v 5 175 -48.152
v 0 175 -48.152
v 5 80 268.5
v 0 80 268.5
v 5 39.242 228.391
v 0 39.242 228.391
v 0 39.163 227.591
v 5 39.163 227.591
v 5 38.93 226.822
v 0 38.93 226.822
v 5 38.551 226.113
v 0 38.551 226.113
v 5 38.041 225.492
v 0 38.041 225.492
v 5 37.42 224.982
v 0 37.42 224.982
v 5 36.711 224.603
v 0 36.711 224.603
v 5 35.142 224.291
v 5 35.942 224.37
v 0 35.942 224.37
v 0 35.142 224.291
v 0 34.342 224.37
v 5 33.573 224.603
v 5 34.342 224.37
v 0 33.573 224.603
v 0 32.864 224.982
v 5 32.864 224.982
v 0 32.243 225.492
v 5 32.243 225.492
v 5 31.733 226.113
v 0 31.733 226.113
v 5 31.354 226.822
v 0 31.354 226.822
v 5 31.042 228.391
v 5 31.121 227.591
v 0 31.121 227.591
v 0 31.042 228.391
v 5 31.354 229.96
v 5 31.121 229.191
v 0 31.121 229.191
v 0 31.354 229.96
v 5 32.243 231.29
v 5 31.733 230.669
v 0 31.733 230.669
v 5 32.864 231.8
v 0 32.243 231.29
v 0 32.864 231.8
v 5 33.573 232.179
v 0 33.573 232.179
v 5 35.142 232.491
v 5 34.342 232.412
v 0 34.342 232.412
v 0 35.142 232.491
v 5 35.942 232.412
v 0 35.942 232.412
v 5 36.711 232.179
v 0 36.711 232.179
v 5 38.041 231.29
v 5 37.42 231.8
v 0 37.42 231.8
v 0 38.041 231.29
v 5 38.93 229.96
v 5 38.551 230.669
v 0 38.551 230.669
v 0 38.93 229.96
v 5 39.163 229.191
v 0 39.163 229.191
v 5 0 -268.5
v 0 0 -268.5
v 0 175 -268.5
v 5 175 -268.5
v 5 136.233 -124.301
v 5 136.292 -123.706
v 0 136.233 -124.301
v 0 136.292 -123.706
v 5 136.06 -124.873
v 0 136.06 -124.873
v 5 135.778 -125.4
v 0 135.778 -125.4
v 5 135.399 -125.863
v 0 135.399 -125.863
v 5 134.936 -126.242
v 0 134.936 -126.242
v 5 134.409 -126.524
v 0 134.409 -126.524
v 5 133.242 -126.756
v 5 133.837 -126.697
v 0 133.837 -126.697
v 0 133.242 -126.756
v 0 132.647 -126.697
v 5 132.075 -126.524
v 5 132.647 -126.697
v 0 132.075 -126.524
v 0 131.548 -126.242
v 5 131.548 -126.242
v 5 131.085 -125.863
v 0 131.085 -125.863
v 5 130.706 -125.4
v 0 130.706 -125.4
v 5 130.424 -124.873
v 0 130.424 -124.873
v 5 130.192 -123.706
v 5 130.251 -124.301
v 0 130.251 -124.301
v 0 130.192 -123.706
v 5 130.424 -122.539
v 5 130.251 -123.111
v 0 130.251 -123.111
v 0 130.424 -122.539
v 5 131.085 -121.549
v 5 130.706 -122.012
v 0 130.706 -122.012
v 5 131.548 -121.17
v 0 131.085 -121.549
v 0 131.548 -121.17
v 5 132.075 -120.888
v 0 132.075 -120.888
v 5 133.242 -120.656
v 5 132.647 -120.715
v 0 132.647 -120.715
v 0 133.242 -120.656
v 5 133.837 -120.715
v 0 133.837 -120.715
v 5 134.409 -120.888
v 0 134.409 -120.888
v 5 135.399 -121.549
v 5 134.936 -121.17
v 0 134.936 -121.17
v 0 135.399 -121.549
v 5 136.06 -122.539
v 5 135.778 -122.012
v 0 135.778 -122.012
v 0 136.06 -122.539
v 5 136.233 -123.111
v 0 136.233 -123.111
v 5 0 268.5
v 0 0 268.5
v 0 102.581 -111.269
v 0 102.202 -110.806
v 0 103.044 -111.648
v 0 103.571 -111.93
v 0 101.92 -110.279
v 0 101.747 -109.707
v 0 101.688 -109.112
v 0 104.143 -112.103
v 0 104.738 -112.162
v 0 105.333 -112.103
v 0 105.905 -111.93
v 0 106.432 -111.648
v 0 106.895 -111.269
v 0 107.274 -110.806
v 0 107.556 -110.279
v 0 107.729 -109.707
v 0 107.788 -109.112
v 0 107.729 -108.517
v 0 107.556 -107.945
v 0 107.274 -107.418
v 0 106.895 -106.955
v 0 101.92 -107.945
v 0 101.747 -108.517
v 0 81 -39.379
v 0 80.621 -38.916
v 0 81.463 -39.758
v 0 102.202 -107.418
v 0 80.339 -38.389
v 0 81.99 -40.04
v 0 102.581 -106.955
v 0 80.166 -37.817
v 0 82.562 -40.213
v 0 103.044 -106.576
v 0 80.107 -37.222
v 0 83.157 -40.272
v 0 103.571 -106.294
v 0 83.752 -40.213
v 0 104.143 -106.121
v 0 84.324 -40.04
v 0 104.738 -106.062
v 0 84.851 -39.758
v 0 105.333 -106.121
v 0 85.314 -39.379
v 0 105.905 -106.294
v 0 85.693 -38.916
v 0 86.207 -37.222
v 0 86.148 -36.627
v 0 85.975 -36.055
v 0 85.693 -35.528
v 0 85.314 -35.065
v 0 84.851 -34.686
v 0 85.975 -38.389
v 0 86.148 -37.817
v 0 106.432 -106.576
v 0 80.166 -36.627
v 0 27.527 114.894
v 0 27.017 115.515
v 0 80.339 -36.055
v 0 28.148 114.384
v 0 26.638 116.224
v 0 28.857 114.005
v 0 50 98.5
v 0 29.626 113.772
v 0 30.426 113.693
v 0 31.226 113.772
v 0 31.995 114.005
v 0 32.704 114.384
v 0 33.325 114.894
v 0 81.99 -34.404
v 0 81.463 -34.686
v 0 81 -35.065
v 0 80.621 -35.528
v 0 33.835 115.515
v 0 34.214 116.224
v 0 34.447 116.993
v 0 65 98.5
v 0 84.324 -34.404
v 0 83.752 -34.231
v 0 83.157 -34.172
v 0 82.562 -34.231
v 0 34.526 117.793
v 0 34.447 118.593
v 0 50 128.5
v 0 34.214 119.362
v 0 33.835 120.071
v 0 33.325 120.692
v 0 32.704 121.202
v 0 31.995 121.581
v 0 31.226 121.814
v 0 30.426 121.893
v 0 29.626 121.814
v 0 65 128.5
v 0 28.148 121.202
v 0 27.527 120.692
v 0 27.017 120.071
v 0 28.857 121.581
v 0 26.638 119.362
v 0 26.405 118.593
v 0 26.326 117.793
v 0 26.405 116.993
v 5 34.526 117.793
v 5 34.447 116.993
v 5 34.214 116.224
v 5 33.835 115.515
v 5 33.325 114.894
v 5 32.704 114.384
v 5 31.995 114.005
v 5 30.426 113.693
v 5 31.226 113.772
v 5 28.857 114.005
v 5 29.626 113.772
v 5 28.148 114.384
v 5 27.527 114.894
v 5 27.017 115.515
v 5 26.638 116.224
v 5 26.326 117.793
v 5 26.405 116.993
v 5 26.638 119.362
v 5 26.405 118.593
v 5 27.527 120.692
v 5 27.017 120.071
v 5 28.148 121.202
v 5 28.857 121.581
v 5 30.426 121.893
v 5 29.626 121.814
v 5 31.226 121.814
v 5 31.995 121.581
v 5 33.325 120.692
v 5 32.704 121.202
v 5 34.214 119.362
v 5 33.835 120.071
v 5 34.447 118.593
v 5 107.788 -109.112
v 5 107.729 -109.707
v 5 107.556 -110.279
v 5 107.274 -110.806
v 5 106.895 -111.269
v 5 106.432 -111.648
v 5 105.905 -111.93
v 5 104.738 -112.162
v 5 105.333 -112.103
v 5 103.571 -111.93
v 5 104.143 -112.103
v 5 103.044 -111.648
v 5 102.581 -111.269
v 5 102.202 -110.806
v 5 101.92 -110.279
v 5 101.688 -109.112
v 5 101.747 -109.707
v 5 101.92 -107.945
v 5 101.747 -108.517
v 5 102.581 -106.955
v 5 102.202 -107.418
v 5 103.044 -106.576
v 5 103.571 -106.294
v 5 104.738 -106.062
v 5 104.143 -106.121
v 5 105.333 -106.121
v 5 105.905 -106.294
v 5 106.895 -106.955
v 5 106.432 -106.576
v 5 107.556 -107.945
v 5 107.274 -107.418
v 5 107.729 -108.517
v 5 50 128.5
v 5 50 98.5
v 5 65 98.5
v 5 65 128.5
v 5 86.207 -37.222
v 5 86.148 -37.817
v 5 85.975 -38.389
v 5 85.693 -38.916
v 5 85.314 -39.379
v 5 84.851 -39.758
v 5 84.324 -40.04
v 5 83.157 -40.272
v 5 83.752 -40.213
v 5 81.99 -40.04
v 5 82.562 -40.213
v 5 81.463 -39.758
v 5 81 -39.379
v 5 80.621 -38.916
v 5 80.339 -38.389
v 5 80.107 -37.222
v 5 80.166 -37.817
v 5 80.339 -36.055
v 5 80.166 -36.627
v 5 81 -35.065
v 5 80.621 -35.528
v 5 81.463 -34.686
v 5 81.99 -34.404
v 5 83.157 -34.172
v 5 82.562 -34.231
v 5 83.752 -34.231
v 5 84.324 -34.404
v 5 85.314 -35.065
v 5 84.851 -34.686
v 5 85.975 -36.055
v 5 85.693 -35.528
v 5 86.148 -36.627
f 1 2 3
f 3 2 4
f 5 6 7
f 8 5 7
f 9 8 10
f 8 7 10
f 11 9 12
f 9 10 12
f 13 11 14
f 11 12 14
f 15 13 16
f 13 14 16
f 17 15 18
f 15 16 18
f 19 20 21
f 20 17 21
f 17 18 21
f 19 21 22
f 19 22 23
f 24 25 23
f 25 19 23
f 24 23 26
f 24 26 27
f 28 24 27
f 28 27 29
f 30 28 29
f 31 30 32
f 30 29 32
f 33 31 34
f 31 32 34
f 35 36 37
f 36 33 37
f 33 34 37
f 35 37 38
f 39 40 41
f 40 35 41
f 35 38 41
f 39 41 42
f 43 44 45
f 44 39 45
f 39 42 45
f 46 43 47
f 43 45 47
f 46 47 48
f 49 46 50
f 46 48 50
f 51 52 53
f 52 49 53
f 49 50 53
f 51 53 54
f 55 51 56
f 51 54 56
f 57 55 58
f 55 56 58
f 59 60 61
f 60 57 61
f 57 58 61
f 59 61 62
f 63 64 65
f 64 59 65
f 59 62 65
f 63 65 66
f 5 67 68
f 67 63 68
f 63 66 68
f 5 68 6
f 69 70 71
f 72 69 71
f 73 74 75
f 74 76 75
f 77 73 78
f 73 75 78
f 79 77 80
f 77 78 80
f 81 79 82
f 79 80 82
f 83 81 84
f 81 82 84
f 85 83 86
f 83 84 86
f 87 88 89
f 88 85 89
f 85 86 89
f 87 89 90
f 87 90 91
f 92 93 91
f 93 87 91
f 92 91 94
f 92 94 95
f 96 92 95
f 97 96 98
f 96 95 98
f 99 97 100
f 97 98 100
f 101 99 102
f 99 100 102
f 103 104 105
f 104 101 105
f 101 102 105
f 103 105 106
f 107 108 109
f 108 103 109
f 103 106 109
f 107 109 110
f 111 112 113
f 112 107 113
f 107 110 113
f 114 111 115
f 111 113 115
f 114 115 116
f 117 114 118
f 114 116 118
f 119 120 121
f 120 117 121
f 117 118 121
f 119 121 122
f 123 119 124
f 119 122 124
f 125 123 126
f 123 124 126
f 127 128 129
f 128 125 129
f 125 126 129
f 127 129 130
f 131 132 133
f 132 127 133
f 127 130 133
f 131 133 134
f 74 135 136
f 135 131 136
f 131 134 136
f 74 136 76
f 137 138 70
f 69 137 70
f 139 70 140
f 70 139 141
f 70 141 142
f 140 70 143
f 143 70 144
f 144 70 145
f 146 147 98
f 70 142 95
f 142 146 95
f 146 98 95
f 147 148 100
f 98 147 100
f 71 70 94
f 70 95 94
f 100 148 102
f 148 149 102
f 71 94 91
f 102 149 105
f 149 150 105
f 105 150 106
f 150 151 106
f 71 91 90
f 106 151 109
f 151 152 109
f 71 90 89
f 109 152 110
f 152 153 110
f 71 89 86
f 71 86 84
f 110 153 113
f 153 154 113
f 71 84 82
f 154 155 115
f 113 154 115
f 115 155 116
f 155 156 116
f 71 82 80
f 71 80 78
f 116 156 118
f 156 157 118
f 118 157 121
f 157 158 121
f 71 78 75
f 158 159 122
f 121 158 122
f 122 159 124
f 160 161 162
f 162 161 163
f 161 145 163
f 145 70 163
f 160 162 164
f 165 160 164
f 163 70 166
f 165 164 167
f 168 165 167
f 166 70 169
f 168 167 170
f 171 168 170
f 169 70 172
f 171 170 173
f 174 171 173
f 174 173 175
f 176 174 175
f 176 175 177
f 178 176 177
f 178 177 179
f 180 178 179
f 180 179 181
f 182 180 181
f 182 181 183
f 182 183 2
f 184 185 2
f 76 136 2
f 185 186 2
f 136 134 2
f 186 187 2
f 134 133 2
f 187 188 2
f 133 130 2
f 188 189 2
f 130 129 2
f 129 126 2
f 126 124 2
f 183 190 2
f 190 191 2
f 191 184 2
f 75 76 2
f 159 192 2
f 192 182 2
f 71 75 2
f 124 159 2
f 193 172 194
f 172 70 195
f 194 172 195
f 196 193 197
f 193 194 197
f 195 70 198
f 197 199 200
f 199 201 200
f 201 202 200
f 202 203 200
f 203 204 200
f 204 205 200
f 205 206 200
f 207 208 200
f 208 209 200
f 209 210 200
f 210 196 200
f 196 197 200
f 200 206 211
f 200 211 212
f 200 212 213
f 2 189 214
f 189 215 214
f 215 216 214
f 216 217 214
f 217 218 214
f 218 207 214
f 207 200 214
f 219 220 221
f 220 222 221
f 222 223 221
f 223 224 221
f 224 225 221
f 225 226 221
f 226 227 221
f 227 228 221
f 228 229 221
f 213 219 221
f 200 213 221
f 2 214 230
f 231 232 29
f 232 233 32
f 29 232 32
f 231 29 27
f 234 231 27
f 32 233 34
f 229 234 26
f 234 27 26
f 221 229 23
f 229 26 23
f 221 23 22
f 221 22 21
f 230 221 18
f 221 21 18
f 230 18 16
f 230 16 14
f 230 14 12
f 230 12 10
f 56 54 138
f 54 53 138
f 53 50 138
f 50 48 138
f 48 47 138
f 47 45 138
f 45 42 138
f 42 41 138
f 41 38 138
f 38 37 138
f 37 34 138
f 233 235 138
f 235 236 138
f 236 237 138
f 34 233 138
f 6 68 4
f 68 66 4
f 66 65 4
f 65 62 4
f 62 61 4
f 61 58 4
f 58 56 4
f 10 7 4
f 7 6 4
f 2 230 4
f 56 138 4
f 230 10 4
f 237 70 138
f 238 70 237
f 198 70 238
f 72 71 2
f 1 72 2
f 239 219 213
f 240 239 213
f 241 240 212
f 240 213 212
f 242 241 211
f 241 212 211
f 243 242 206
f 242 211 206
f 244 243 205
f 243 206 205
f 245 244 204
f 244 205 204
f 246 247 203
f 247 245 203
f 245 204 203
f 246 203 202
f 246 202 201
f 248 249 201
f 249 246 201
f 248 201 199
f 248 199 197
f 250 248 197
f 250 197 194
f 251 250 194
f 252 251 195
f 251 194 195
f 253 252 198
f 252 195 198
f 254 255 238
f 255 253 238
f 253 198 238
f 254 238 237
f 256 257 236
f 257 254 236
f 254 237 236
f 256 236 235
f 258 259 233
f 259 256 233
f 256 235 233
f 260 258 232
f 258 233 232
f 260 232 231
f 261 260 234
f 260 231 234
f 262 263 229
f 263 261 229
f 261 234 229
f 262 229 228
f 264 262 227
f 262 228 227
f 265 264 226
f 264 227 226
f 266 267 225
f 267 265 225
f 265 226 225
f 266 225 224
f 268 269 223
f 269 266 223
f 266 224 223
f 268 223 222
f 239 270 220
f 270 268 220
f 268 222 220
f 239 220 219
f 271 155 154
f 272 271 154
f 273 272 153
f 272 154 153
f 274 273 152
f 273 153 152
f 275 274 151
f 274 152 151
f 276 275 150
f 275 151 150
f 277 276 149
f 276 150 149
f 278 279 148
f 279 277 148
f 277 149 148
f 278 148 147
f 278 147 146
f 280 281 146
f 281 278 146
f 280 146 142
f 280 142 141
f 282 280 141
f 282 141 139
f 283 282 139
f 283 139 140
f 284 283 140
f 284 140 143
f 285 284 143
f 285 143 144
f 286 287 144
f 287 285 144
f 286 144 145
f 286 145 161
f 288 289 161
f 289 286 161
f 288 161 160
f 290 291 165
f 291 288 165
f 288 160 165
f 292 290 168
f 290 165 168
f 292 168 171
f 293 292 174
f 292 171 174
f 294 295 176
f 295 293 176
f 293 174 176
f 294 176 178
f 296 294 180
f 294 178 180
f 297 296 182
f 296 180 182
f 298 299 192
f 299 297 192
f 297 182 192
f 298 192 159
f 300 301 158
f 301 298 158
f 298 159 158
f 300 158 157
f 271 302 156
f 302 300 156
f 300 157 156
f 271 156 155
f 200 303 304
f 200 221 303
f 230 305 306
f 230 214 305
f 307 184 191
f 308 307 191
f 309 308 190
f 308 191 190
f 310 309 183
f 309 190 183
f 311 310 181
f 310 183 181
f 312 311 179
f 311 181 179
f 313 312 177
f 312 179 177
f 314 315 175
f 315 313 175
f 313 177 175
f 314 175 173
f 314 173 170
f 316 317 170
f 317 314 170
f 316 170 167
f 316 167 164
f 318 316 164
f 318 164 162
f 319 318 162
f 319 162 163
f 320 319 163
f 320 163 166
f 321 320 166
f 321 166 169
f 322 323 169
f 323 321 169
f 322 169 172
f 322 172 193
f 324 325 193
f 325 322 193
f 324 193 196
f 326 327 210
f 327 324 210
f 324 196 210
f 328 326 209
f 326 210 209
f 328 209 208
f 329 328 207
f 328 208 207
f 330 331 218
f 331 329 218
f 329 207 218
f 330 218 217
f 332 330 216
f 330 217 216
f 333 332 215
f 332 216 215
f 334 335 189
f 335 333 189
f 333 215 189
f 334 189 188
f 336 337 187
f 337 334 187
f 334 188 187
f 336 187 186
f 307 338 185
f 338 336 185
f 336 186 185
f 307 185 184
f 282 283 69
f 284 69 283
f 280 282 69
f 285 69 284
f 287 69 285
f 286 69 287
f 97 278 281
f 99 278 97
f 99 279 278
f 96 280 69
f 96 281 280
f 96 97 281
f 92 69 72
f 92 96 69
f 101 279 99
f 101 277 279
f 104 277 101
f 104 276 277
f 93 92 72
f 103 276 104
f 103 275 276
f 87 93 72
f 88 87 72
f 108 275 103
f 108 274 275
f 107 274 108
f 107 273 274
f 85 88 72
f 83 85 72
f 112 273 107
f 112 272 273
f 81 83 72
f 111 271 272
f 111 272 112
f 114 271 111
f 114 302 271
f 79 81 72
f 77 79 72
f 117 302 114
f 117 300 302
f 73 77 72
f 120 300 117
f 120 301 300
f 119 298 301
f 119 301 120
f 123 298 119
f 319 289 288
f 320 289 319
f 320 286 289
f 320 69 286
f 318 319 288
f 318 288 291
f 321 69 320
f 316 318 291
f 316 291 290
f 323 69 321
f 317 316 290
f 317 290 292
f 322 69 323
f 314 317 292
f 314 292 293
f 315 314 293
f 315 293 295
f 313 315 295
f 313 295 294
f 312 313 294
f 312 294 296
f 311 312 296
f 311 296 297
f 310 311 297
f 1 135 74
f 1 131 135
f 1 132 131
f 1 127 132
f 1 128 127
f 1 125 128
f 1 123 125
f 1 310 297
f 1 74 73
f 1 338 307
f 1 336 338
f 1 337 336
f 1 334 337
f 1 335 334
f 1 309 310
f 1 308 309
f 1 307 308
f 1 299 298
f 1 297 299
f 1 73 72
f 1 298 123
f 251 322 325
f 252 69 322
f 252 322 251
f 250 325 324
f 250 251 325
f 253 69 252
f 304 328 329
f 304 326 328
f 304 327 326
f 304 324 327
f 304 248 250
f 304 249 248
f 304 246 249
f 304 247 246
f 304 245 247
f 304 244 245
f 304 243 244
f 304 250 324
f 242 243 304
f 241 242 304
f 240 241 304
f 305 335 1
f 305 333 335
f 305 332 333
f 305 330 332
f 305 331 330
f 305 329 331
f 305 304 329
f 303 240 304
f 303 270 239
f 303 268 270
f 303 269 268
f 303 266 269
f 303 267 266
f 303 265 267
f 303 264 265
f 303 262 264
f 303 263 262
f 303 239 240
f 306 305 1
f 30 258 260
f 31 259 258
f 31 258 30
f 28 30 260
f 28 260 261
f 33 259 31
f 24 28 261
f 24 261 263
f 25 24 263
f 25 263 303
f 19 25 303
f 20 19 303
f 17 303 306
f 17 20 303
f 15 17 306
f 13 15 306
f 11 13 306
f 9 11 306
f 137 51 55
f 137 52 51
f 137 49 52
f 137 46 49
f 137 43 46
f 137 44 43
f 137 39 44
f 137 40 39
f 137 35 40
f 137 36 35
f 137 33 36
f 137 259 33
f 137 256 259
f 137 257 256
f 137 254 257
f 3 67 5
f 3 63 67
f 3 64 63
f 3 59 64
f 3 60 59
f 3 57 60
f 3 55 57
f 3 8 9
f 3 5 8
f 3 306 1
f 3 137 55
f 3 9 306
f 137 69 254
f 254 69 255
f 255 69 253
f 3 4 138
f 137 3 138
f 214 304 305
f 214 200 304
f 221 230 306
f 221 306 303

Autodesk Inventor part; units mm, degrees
ref_plane "YZ Plane" through (0, 0, 0) normal (1, 0, 0) x (0, 1, 0)
ref_plane "XZ Plane" through (0, 0, 0) normal (0, 1, 0) x (-1, 0, 0)
ref_plane "XY Plane" through (0, 0, 0) normal (0, 0, 1) x (1, 0, 0)
sketch "スケッチ1" plane through (0, 0, 0) normal (1, 0, 0) x (0, 1, 0)
  line L0 (0, 268.5) -> (0, -268.5)
  line L1 (0, -268.5) -> (175, -268.5)
  line L2 (175, -268.5) -> (175, -48.1515)
  line L3 (175, -48.1515) -> (80, 268.5)
  line L4 (80, 268.5) -> (0, 268.5)
  circle A0 centre (35.142, 228.391) radius 4.1
  circle A1 centre (30.426, 117.793) radius 4.1
  circle A2 centre (83.157, -37.222) radius 3.05
  circle A3 centre (104.738, -109.112) radius 3.05
  circle A4 centre (133.242, -123.706) radius 3.05
  line L5 (65, 128.5) -> (50, 128.5)
  line L6 (50, 128.5) -> (50, 98.5)
  line L7 (50, 98.5) -> (65, 98.5)
  line L8 (65, 98.5) -> (65, 128.5)
  point P0 (0, 0)
  point P1 (0, 0)
  dimension "d0" = 537
  dimension "d1" = 175
  dimension "d2" = 80
  dimension "d3" = 16.7
  dimension "d4" = 40.109
  dimension "d5" = 35.142
  dimension "d6" = 8.2
  dimension "d7" = 150.707
  dimension "d8" = 30.426
  dimension "d9" = 8.2
  dimension "d10" = 305.722
  dimension "d11" = 83.157
  dimension "d12" = 377.612
  dimension "d13" = 104.738
  dimension "d14" = 6.1
  dimension "d15" = 6.1
  dimension "d16" = 133.242
  dimension "d17" = 392.206
  dimension "d18" = 6.1
  dimension "d19" = 140
  dimension "d20" = 50
  dimension "d21" = 30
  dimension "d22" = 15
extrude "押し出し1" add sketch "スケッチ1" along normal blind 5
